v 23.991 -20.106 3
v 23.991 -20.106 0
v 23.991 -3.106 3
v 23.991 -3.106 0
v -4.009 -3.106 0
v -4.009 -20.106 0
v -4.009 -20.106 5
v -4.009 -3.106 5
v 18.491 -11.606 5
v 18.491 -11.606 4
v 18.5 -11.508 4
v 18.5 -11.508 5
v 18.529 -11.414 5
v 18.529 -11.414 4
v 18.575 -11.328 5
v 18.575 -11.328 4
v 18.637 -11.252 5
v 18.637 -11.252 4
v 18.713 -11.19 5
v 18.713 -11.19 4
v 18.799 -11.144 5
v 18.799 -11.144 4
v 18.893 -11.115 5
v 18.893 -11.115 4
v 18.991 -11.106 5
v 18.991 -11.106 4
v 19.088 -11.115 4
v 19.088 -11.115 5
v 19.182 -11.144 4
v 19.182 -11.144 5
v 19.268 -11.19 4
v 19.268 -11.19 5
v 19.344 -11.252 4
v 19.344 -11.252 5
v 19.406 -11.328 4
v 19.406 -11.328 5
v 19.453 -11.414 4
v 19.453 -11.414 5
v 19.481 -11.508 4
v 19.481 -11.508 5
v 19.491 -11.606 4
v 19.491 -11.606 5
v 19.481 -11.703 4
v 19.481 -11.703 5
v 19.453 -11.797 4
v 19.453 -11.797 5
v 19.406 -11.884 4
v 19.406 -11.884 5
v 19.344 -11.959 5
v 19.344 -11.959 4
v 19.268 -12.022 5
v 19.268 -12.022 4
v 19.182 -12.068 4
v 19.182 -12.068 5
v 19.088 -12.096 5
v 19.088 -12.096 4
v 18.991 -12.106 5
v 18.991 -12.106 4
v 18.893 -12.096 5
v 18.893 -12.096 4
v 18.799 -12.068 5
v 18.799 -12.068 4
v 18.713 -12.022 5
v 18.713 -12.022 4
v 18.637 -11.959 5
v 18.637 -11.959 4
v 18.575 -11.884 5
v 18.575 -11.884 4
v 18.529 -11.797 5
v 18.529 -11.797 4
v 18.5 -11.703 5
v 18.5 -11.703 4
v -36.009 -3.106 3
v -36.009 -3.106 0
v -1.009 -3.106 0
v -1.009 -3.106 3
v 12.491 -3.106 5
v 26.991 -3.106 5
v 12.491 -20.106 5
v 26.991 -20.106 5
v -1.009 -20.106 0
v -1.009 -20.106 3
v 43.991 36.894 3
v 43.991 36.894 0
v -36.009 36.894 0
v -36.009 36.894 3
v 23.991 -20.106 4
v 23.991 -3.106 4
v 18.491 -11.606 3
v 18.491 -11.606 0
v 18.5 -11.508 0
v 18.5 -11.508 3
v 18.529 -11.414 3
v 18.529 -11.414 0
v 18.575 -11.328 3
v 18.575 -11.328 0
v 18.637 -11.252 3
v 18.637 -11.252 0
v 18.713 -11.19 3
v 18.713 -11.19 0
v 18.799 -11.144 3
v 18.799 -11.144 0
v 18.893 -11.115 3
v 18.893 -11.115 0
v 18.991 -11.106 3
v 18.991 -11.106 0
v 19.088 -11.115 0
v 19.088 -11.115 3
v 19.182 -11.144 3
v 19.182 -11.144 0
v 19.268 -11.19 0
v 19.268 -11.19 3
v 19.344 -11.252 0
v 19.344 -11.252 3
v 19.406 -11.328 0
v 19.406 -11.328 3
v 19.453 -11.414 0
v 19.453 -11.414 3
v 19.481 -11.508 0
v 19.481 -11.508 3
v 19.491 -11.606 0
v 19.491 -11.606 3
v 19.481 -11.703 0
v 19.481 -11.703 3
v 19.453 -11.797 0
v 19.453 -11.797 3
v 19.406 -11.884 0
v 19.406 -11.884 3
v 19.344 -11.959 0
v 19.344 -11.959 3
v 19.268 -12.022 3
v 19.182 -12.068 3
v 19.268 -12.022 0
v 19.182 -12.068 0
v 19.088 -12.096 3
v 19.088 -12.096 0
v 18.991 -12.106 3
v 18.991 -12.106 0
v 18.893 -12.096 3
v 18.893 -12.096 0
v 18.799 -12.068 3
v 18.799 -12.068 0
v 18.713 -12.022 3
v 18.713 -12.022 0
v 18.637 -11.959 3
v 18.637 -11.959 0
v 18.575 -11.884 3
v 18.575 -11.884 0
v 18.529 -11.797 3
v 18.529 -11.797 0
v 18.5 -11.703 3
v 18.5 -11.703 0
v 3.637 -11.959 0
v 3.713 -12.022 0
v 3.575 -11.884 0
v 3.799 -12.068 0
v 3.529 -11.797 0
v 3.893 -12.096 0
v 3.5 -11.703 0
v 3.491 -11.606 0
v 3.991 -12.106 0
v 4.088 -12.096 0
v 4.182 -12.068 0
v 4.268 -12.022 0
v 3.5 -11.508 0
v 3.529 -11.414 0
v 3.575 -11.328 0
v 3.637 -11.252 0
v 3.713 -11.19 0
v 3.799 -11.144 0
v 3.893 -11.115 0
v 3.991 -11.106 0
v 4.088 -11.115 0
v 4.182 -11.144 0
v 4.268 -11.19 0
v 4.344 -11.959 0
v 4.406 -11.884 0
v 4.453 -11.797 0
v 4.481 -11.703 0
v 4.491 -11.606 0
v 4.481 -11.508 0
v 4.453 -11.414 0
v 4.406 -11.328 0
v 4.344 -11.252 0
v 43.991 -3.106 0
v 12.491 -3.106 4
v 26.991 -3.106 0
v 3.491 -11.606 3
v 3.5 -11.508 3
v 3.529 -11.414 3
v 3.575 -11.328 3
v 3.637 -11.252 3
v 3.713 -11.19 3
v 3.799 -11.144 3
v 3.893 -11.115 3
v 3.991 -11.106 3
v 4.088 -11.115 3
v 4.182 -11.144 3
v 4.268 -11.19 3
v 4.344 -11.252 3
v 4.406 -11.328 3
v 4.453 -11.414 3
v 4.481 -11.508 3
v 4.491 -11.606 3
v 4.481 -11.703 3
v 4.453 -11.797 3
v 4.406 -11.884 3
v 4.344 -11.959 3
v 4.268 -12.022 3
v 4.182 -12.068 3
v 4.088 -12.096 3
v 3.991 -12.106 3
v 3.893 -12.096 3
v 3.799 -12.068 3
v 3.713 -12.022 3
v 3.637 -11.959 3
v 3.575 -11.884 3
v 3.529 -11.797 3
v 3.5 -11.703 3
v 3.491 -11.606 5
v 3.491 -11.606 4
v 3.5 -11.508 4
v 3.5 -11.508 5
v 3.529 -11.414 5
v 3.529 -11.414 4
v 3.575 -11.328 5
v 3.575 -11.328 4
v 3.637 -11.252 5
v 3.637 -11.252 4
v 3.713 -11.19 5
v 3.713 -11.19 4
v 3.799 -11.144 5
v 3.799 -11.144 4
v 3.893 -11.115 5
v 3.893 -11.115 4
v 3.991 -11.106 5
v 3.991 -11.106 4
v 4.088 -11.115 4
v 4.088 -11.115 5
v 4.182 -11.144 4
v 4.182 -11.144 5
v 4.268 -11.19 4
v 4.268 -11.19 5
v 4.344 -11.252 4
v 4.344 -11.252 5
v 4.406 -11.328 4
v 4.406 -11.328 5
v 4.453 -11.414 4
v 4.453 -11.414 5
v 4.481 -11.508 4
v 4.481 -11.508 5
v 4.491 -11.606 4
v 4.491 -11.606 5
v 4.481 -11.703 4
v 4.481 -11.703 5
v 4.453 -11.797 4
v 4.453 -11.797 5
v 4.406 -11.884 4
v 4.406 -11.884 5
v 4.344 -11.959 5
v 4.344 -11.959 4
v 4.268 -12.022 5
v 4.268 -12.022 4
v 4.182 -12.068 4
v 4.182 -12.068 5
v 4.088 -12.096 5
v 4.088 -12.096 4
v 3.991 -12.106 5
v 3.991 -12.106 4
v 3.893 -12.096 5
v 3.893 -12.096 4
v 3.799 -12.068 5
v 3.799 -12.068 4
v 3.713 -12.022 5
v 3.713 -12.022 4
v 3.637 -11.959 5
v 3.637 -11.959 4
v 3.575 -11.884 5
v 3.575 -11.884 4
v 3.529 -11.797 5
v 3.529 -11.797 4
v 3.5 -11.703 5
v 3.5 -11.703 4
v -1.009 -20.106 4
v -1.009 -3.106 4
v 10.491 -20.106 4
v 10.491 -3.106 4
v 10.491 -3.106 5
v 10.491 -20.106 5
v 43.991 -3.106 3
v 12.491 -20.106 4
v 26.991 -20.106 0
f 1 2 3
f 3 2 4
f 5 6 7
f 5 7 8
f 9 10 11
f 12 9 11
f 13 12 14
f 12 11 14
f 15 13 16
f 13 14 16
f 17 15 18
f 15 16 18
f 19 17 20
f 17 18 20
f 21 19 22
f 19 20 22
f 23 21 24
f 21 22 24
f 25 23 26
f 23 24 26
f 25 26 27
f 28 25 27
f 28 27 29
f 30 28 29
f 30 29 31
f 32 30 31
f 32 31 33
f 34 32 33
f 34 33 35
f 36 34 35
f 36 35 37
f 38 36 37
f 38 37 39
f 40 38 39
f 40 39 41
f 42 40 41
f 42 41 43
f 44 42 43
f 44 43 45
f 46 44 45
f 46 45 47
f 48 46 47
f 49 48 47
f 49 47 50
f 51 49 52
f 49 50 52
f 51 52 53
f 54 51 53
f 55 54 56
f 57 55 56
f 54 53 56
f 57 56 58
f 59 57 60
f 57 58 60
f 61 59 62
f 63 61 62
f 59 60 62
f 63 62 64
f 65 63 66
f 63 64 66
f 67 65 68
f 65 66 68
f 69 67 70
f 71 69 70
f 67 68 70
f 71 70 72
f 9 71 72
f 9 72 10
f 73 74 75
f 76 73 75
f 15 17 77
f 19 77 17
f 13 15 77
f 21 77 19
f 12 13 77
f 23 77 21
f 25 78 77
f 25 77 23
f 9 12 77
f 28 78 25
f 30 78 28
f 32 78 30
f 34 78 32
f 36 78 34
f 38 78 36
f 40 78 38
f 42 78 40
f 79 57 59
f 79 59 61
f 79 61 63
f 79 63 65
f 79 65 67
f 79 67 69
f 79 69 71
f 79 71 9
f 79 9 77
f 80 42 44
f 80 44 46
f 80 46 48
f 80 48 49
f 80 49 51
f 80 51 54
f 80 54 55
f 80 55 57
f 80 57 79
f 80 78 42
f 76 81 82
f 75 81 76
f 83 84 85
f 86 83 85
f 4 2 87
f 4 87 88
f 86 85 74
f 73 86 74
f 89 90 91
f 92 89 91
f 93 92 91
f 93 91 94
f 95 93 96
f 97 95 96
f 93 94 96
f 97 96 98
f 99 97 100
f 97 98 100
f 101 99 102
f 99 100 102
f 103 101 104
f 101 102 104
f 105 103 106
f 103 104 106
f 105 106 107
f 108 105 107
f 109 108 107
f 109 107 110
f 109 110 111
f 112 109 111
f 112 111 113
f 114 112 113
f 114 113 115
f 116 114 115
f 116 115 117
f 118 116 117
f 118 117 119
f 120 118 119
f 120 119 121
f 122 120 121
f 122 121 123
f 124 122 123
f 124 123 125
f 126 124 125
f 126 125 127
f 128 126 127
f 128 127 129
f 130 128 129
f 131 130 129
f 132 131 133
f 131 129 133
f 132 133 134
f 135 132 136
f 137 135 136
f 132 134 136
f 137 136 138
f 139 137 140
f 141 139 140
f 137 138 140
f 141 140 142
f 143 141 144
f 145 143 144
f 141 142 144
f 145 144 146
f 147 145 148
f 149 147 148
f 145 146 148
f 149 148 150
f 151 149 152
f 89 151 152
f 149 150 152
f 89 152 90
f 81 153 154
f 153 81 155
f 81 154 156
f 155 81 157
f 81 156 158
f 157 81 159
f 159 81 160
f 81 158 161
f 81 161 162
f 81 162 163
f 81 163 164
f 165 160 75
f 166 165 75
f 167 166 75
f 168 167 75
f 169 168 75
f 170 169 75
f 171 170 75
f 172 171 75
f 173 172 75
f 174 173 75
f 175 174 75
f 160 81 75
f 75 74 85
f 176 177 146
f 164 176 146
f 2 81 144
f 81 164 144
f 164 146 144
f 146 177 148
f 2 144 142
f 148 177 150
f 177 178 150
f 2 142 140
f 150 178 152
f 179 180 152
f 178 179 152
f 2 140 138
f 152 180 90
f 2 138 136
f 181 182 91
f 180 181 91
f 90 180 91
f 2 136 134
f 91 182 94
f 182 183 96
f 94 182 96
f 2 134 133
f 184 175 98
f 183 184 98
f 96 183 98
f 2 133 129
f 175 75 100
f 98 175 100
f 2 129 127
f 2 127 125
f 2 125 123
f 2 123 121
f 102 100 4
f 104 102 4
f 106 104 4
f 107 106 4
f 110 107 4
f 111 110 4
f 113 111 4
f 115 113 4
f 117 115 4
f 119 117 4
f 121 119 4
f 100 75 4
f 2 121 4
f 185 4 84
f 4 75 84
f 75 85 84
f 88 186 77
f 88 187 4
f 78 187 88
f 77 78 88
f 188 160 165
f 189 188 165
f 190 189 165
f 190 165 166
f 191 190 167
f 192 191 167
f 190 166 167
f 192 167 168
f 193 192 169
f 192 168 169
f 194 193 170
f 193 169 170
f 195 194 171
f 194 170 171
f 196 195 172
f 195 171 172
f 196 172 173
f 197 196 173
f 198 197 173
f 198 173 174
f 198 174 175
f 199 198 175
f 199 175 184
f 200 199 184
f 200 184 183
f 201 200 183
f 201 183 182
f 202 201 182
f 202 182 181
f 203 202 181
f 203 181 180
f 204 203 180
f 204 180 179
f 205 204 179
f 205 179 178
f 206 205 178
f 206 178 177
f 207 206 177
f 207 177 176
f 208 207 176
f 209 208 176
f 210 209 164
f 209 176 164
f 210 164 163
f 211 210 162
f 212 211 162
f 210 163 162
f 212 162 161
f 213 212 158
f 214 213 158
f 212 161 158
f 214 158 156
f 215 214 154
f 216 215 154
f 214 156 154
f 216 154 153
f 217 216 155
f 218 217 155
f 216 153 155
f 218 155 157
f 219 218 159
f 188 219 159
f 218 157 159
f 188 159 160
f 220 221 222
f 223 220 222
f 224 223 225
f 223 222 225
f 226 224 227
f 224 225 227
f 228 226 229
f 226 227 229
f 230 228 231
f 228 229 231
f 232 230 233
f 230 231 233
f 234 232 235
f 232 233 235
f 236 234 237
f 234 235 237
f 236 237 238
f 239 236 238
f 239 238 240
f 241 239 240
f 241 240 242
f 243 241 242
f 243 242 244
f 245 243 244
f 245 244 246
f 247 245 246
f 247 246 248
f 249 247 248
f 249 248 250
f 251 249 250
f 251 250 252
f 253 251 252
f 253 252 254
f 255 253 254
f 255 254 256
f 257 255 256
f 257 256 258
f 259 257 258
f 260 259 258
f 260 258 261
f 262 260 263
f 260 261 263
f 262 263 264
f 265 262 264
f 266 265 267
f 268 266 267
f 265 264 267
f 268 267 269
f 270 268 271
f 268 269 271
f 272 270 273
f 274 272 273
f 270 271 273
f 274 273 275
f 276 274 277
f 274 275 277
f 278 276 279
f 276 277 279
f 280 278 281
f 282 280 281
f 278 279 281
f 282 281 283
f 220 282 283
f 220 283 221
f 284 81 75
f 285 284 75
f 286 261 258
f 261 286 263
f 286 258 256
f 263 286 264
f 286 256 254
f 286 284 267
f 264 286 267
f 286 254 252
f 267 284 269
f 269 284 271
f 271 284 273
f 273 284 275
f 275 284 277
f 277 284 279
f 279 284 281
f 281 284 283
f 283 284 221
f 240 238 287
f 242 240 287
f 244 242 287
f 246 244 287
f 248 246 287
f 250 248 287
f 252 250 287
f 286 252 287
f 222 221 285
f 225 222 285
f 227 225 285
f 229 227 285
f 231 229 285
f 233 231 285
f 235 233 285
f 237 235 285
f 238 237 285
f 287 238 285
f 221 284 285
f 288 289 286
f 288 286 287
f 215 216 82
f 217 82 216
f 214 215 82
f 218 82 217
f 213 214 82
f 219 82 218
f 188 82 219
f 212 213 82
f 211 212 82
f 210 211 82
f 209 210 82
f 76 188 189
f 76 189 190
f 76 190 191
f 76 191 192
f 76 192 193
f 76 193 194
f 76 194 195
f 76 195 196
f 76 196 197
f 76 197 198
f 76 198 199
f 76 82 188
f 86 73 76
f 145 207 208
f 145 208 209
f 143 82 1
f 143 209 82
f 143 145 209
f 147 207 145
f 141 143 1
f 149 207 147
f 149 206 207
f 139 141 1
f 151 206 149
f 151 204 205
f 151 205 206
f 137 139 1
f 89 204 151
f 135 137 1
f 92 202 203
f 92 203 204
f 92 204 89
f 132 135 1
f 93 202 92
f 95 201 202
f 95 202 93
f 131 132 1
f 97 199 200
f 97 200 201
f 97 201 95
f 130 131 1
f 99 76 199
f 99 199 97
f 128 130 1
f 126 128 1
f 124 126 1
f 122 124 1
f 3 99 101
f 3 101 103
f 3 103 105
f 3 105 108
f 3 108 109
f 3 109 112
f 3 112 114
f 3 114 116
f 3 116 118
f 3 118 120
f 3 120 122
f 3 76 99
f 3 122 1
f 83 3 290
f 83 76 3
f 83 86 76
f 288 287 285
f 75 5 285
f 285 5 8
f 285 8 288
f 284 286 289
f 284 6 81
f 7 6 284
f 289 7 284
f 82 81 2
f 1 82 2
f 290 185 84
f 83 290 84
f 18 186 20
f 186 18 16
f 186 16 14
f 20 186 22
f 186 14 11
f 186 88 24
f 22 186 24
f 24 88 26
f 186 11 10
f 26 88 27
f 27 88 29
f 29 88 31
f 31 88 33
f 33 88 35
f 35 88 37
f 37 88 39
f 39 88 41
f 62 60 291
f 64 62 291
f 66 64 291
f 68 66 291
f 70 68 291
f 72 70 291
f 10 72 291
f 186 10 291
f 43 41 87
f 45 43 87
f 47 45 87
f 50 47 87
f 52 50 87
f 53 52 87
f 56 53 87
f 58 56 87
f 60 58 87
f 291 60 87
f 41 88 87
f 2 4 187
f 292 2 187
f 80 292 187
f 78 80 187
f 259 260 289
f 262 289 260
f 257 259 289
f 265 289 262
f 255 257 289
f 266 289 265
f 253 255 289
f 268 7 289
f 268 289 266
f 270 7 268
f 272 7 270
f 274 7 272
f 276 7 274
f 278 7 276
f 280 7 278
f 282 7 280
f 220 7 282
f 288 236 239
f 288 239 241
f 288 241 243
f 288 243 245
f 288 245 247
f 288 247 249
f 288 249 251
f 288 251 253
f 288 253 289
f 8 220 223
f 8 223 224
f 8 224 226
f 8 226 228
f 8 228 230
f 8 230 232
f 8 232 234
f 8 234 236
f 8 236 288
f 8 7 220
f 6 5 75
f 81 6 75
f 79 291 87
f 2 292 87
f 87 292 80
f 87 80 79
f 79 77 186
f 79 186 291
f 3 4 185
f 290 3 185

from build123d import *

# Parameters (mm, degrees)
F0_W     = 25
F0_H     = 17
F0_H_2   = 40
F1_DEPTH = 3
F0_W_2   = 3
F2_DEPTH = 5
F3_W     = 17
F3_H     = 1
F4_DEPTH = 11.5
F5_W     = 17
F5_H     = 1
F6_DEPTH = 11.5
F8_D     = 1
F8_2_D   = 1
F10_D    = 1
F10_2_D  = 1


with BuildPart() as f1:
    # F0 (on Top) → F1 (new body)
    with BuildSketch(Plane.XY):
        with Locations((11.49063, -11.605833)):
            Rectangle(F0_W, F0_H)
        Polygon((-36.00937, 36.894167), (-36.00937, -3.105833), (-4.00937, -3.105833), (-1.00937, -3.105833), (-1.00937, 36.894167), align=None)
        with Locations((11.49063, 16.894167)):
            Rectangle(F0_W, F0_H_2)
        Polygon((23.99063, 36.894167), (23.99063, -3.105833), (26.99063, -3.105833), (43.99063, -3.105833), (43.99063, 36.894167), align=None)
    extrude(amount=F1_DEPTH)

    # F8 (through all)
    with Locations(Plane.XY.offset(5)):
        with Locations((3.99063, -11.605833)):
            Hole(F8_D / 2)

    # F10 (through all)
    with Locations(Plane.XY.offset(5)):
        with Locations((18.99063, -11.605833)):
            Hole(F10_D / 2)


with BuildPart() as f2:
    # F0 (on Top) → F2 (new body)
    with BuildSketch(Plane.XY):
        with Locations((-2.50937, -11.605833)):
            Rectangle(F0_W_2, F0_H)
        with Locations((25.49063, -11.605833)):
            Rectangle(F0_W_2, F0_H)
    extrude(amount=F2_DEPTH)

    # F3 (on face) → F4 (join)
    with BuildSketch(Plane.YZ.offset(-1.00937)):
        with Locations((-11.605833, 4.5)):
            Rectangle(F3_W, F3_H)
    extrude(amount=F4_DEPTH)

    # F5 (on face) → F6 (join)
    with BuildSketch(Plane(origin=(23.99063, 0, 0), x_dir=(0, -1, 0), z_dir=(-1, 0, 0))):
        with Locations((11.605833, 4.5)):
            Rectangle(F5_W, F5_H)
    extrude(amount=F6_DEPTH)

    # F8#2 (through all)
    with Locations(Plane.XY.offset(5)):
        with Locations((3.99063, -11.605833)):
            Hole(F8_2_D / 2)

    # F10#2 (through all)
    with Locations(Plane.XY.offset(5)):
        with Locations((18.99063, -11.605833)):
            Hole(F10_2_D / 2)


solid = Compound([f1.part, f2.part])
